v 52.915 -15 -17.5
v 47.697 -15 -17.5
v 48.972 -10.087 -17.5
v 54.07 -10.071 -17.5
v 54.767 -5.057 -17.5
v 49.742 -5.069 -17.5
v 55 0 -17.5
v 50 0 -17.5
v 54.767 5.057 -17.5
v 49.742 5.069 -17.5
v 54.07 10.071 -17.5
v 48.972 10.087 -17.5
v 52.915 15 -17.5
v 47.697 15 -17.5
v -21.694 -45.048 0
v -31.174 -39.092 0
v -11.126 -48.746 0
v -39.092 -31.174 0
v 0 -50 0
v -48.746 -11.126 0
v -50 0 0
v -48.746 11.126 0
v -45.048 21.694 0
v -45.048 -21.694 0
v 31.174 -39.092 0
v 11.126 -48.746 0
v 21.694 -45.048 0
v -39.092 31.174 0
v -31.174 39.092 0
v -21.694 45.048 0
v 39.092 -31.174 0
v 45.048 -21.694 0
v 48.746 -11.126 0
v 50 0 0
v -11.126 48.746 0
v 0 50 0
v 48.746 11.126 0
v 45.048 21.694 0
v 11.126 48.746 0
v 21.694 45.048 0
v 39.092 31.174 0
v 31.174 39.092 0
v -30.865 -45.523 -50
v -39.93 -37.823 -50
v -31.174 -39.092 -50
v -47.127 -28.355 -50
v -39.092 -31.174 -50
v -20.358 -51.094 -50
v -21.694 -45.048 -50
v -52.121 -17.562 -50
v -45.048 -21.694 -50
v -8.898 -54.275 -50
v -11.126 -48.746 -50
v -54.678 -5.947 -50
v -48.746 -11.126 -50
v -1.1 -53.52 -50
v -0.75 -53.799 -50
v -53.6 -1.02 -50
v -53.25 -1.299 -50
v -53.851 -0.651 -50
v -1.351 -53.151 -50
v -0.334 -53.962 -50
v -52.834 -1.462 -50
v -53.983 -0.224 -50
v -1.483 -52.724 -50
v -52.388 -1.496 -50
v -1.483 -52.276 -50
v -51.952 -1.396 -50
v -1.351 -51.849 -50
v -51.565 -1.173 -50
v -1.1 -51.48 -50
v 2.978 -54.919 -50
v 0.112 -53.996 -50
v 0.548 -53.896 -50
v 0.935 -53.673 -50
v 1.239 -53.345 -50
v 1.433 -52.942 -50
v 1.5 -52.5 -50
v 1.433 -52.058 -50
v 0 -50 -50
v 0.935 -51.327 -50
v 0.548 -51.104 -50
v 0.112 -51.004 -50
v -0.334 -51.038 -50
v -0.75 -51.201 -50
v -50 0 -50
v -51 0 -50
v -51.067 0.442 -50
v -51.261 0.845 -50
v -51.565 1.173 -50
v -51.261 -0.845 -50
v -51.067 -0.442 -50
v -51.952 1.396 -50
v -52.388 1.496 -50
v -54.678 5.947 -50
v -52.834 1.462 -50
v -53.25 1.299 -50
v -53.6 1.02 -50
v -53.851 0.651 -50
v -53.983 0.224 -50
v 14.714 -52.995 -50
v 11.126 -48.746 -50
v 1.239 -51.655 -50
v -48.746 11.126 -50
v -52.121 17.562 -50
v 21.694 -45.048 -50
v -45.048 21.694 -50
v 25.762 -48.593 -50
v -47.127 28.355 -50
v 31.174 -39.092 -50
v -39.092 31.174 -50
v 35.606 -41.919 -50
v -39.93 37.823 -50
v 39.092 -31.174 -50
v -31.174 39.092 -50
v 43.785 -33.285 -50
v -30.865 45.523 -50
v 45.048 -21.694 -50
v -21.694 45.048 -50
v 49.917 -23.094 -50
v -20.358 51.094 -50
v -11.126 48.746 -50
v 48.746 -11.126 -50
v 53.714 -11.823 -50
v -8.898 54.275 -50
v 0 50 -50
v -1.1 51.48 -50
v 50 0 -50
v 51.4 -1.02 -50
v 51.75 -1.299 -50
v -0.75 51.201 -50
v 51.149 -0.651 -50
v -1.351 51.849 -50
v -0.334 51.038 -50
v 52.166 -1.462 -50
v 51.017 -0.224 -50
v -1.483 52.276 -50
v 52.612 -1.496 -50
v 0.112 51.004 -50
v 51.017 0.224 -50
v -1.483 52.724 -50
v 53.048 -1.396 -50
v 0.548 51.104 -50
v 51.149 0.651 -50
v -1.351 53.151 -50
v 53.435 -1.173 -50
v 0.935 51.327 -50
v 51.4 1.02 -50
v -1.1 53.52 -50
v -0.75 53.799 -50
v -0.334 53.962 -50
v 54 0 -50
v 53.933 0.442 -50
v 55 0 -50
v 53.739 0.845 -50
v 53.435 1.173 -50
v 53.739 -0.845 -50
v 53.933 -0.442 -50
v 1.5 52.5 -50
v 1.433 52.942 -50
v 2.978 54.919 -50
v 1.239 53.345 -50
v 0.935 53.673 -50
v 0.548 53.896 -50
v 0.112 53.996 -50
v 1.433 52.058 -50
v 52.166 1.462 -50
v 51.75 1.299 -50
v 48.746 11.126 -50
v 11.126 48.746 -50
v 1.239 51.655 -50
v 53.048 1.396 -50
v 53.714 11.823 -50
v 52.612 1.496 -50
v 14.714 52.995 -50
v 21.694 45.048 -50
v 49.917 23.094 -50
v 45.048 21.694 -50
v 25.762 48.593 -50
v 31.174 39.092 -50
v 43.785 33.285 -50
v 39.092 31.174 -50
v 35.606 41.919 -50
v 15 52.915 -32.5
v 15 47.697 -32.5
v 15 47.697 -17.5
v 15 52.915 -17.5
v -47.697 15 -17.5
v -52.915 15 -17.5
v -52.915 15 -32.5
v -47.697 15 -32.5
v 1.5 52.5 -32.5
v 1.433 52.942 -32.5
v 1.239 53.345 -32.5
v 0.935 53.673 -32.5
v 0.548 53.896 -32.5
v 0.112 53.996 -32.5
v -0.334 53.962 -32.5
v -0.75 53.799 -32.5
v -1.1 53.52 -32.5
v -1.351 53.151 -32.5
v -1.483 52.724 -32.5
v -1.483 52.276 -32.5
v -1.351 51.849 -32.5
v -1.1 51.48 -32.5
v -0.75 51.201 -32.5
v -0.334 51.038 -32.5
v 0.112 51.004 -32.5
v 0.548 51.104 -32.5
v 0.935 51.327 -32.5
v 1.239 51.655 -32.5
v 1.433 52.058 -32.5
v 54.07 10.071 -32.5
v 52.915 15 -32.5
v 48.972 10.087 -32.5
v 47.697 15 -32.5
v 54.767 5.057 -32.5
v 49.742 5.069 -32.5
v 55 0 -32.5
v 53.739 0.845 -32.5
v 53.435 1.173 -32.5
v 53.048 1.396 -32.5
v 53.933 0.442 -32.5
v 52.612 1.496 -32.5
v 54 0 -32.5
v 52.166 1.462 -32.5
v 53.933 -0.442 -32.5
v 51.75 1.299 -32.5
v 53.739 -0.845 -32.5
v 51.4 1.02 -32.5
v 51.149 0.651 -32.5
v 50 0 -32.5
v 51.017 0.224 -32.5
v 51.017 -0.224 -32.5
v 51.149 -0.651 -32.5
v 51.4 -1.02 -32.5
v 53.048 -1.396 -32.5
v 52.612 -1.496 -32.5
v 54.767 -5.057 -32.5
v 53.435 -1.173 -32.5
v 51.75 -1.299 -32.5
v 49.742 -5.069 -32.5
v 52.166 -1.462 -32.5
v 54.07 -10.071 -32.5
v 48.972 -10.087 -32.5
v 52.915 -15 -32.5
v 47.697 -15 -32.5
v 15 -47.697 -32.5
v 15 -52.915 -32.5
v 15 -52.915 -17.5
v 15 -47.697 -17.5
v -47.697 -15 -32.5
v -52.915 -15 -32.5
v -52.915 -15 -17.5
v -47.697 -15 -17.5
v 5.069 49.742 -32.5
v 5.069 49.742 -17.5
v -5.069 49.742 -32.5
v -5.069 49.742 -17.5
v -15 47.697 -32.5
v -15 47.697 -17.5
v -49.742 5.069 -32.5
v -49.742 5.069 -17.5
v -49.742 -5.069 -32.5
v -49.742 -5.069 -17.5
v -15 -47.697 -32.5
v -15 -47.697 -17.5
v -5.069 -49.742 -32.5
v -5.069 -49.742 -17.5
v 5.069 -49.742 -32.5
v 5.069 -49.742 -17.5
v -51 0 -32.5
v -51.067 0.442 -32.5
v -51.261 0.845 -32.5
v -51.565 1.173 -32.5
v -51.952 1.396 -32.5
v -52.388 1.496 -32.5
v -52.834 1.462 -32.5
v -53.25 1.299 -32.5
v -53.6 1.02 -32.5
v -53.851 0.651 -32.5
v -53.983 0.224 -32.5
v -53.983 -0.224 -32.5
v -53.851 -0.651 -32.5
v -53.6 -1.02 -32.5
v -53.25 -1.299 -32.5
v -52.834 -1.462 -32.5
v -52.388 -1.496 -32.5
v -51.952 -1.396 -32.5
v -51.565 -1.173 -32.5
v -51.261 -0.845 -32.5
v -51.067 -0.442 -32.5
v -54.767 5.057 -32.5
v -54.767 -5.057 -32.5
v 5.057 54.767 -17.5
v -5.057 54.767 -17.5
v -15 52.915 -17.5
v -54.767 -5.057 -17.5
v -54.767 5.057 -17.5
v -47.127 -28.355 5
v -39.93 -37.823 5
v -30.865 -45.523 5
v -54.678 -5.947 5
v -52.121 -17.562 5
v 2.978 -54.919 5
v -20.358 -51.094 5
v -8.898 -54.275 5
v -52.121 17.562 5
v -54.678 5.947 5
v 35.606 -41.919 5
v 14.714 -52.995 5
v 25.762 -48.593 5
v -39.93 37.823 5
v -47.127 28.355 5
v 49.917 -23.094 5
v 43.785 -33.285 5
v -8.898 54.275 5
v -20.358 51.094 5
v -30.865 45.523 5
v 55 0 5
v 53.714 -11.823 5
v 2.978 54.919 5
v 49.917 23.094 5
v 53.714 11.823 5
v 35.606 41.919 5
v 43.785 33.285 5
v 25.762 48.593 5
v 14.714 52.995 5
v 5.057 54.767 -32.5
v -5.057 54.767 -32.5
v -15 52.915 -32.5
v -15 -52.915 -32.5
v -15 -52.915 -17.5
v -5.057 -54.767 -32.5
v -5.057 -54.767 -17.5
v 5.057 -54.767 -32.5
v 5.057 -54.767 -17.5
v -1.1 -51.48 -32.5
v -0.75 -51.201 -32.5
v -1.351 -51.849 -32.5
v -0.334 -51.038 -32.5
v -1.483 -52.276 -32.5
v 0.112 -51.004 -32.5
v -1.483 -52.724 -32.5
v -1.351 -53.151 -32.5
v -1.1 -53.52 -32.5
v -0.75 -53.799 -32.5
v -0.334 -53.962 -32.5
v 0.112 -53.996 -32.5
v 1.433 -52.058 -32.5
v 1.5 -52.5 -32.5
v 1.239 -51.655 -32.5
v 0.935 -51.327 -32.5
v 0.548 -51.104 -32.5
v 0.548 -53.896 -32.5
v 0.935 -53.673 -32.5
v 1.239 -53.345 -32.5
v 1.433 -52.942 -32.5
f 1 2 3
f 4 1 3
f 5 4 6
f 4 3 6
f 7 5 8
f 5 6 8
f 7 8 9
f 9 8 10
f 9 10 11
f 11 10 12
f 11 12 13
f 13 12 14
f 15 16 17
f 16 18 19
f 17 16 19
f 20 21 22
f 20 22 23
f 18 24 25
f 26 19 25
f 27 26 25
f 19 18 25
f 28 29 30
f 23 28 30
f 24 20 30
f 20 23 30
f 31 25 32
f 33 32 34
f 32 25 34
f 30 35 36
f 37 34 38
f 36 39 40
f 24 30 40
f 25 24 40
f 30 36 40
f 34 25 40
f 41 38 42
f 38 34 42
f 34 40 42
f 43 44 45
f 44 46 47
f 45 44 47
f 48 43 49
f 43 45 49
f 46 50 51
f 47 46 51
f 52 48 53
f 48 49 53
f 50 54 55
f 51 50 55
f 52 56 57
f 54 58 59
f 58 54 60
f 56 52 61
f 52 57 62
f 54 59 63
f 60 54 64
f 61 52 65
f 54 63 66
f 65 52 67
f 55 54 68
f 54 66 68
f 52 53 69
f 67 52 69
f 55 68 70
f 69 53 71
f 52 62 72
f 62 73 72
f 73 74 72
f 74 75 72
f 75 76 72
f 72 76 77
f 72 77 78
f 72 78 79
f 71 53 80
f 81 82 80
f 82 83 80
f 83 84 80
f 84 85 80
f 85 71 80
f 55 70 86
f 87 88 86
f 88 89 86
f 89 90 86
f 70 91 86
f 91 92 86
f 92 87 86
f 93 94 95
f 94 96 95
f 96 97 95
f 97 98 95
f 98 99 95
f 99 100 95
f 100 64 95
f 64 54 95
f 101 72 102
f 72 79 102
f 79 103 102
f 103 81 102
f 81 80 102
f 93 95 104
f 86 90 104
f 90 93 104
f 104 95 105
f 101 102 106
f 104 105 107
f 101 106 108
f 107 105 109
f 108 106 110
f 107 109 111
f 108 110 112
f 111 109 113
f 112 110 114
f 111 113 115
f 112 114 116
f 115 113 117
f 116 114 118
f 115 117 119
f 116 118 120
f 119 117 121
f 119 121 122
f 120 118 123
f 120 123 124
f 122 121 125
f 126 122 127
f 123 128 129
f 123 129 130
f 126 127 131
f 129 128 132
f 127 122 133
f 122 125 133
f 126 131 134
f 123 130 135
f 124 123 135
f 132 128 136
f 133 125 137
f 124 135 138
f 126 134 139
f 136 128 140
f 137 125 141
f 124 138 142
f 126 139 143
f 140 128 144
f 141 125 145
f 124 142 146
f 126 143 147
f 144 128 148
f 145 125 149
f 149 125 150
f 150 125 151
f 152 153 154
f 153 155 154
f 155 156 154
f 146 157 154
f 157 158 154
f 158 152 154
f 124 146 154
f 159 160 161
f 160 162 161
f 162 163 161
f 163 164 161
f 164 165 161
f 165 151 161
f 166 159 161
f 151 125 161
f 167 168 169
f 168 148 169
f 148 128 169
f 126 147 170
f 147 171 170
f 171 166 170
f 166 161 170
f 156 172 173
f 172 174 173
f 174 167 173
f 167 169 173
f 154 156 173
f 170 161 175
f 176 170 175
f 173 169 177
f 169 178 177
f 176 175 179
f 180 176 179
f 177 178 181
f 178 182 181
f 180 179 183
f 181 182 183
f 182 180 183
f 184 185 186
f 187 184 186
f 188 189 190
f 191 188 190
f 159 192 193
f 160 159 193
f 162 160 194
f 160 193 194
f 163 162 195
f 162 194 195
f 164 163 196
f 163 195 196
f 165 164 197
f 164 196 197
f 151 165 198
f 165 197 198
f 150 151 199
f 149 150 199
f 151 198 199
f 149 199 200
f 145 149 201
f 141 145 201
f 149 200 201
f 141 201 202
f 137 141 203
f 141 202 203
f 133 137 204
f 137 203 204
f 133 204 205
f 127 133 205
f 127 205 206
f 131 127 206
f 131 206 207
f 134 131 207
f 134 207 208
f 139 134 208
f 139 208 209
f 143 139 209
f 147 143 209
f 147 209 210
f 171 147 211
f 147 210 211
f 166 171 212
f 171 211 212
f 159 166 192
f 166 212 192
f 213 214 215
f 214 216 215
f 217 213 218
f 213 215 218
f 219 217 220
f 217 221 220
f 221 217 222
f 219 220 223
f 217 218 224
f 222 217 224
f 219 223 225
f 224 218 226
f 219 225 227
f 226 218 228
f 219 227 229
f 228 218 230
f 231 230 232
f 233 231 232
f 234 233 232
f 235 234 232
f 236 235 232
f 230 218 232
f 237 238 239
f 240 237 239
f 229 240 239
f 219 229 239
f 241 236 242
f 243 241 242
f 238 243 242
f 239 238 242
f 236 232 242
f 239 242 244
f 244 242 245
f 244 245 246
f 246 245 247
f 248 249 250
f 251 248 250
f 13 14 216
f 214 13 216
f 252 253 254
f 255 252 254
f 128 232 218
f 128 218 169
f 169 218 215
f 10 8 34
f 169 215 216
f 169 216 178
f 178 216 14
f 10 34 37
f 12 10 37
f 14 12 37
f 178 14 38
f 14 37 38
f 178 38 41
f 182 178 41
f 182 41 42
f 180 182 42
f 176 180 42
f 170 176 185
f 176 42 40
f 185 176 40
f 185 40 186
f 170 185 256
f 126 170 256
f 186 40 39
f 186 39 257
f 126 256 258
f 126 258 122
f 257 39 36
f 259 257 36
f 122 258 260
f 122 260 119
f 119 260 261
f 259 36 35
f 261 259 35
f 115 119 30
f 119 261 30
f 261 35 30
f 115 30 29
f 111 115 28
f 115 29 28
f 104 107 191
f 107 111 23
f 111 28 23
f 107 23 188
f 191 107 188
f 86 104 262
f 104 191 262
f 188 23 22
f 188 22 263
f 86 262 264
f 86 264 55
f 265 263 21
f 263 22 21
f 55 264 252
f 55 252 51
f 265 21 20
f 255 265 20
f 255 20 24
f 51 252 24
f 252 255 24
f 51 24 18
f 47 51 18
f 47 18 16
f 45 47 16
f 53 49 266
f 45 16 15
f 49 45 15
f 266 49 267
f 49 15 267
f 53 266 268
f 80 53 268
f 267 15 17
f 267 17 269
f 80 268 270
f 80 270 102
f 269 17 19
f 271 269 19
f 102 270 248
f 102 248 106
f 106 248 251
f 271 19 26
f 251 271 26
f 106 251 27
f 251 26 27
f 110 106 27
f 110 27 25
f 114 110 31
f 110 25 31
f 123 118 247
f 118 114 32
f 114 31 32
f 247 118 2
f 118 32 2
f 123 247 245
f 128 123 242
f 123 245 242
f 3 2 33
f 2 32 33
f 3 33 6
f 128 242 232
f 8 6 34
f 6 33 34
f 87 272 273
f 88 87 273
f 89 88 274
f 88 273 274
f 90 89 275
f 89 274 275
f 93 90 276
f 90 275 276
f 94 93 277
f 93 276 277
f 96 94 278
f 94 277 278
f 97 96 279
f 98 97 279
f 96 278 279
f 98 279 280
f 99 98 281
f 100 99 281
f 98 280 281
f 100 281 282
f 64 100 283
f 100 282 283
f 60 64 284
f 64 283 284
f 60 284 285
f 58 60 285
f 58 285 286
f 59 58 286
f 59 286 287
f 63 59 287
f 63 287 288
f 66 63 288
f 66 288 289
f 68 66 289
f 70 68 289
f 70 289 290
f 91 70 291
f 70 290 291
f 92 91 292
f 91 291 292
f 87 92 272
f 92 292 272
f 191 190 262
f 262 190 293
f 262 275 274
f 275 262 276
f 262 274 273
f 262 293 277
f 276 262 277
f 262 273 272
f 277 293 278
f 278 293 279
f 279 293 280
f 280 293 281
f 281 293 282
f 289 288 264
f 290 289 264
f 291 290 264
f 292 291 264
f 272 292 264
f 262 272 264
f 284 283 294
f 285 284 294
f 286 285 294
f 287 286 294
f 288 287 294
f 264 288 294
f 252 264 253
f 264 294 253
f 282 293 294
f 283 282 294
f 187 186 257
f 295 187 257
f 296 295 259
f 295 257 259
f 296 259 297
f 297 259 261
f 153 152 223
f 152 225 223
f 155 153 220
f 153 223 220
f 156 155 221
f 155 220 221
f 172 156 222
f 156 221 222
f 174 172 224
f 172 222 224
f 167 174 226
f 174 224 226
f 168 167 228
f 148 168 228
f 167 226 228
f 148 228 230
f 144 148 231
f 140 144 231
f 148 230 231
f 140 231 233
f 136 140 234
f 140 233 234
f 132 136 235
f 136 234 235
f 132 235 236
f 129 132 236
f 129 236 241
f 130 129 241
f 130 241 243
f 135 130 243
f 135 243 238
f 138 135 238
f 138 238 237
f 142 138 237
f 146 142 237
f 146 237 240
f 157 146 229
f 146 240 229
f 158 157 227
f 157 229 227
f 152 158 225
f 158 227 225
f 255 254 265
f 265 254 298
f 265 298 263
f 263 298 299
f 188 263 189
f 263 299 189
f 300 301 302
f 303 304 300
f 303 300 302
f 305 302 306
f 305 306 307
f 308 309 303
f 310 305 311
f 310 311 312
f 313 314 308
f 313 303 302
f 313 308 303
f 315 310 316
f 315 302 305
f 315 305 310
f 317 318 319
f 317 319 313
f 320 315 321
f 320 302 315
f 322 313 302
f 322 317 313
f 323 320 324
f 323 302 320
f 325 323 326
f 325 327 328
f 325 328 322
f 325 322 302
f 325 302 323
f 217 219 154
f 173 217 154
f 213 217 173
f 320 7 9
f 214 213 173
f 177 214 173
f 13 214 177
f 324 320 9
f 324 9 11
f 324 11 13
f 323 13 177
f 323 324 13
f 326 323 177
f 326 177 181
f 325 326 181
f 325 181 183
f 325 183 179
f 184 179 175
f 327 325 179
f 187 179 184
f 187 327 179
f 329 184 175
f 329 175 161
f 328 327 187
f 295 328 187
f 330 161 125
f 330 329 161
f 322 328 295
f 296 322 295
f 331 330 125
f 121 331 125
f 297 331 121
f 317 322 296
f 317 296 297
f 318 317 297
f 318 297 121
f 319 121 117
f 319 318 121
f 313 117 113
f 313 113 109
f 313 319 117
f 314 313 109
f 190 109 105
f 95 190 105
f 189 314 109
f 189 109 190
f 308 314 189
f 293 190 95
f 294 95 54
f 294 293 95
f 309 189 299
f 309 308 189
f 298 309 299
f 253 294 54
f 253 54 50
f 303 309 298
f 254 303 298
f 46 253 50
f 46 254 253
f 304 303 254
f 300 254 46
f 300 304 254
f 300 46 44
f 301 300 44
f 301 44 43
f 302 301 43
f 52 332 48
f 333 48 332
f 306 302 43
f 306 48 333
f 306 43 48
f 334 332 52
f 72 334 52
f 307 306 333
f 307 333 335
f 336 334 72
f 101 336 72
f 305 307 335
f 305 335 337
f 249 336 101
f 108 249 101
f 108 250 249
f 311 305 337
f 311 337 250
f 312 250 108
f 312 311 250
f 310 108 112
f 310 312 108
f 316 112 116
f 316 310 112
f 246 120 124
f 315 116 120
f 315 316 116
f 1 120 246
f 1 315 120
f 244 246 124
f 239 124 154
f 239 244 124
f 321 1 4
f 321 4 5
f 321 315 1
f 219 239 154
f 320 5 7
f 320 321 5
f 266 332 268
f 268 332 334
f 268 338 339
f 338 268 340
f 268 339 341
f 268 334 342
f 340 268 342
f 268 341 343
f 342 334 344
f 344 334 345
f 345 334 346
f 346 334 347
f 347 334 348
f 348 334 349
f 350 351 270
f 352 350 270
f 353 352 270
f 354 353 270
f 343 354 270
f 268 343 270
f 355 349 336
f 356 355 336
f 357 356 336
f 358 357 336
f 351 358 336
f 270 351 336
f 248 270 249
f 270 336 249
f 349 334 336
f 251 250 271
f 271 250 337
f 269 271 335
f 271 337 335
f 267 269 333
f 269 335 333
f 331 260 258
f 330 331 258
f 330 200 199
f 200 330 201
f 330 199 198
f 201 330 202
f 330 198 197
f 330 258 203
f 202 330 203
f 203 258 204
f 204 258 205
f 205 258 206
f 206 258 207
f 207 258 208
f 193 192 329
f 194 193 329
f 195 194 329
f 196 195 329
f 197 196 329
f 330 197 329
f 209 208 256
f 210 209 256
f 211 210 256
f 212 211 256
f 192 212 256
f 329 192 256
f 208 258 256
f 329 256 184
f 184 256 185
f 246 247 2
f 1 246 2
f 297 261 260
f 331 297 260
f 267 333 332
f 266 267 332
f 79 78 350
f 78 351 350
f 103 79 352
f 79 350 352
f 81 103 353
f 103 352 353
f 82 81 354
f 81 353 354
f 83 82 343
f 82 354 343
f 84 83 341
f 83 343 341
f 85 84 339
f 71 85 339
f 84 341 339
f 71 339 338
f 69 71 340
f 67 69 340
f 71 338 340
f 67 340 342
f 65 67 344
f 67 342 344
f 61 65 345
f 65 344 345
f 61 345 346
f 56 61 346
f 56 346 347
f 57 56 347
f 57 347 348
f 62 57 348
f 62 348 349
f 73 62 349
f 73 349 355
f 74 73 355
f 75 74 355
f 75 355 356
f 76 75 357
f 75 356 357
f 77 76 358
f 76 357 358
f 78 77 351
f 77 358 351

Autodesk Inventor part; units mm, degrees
ref_plane "YZ Plane" through (0, 0, 0) normal (1, 0, 0) x (0, 1, 0)
ref_plane "XZ Plane" through (0, 0, 0) normal (0, 1, 0) x (-1, 0, 0)
ref_plane "XY Plane" through (0, 0, 0) normal (0, 0, 1) x (1, 0, 0)
sketch "Sketch1" plane through (0, 0, 0) normal (0, 0, 1) x (1, 0, 0)
  circle A0 centre (0, 0) radius 55
  circle A1 centre (0, 0) radius 50
  circle A2 centre (0, 52.5) radius 1.5
  circle A3 centre (-52.5, 0) radius 1.5
  circle A4 centre (0, -52.5) radius 1.5
  circle A5 centre (52.5, 0) radius 1.5
  dimension "d2" = 110
  dimension "d3" = 100
  dimension "d4" = 3
  dimension "d5" = 0
  dimension "d6" = 52.5
  dimension "d7" = 360
extrude "Extrusion1" add sketch "Sketch1" along normal blind 5 contours A0 | A1
extrude "Extrusion2" add sketch "Sketch1" against normal blind 50
extrude "Extrusion3" add sketch "Sketch1" along normal mid plane 10 contours A2 | A3 | A4 | A5
sketch "Sketch2" plane through (0, 0, 0) normal (0, 1, 0) x (-1, 0, 0)
  line L0 (-15, -17.5) -> (15, -17.5)
  line L1 (15, -17.5) -> (15, -32.5)
  line L2 (15, -32.5) -> (-15, -32.5)
  line L3 (-15, -32.5) -> (-15, -17.5)
  line L4 (-15, -17.5) -> (15, -32.5) construction
  line L5 (15, -17.5) -> (-15, -32.5) construction
  point P0 (0, 0)
  point P1 (0, -25)
  dimension "d14" = 0
  dimension "d15" = 25
  dimension "d16" = 30
  dimension "d17" = 15
extrude "Extrusion4" cut sketch "Sketch2" along normal through all both and the other way through all
pattern_circular "Circular Pattern1" count 3 over 180 about axis through (0, 0, 0) along (0, 0, -1) of "Extrusion4"
extrude "Extrusion5" add sketch "Sketch1" against normal blind 17.5 contours A2 | A3 | A4 | A5
equation "\"d2\" = Diameter"
equation "\"d6\" = 0.25 * d2 + 0.25 * d3"
equation "\"Diameter\" = 110"
properties part number "Base"
